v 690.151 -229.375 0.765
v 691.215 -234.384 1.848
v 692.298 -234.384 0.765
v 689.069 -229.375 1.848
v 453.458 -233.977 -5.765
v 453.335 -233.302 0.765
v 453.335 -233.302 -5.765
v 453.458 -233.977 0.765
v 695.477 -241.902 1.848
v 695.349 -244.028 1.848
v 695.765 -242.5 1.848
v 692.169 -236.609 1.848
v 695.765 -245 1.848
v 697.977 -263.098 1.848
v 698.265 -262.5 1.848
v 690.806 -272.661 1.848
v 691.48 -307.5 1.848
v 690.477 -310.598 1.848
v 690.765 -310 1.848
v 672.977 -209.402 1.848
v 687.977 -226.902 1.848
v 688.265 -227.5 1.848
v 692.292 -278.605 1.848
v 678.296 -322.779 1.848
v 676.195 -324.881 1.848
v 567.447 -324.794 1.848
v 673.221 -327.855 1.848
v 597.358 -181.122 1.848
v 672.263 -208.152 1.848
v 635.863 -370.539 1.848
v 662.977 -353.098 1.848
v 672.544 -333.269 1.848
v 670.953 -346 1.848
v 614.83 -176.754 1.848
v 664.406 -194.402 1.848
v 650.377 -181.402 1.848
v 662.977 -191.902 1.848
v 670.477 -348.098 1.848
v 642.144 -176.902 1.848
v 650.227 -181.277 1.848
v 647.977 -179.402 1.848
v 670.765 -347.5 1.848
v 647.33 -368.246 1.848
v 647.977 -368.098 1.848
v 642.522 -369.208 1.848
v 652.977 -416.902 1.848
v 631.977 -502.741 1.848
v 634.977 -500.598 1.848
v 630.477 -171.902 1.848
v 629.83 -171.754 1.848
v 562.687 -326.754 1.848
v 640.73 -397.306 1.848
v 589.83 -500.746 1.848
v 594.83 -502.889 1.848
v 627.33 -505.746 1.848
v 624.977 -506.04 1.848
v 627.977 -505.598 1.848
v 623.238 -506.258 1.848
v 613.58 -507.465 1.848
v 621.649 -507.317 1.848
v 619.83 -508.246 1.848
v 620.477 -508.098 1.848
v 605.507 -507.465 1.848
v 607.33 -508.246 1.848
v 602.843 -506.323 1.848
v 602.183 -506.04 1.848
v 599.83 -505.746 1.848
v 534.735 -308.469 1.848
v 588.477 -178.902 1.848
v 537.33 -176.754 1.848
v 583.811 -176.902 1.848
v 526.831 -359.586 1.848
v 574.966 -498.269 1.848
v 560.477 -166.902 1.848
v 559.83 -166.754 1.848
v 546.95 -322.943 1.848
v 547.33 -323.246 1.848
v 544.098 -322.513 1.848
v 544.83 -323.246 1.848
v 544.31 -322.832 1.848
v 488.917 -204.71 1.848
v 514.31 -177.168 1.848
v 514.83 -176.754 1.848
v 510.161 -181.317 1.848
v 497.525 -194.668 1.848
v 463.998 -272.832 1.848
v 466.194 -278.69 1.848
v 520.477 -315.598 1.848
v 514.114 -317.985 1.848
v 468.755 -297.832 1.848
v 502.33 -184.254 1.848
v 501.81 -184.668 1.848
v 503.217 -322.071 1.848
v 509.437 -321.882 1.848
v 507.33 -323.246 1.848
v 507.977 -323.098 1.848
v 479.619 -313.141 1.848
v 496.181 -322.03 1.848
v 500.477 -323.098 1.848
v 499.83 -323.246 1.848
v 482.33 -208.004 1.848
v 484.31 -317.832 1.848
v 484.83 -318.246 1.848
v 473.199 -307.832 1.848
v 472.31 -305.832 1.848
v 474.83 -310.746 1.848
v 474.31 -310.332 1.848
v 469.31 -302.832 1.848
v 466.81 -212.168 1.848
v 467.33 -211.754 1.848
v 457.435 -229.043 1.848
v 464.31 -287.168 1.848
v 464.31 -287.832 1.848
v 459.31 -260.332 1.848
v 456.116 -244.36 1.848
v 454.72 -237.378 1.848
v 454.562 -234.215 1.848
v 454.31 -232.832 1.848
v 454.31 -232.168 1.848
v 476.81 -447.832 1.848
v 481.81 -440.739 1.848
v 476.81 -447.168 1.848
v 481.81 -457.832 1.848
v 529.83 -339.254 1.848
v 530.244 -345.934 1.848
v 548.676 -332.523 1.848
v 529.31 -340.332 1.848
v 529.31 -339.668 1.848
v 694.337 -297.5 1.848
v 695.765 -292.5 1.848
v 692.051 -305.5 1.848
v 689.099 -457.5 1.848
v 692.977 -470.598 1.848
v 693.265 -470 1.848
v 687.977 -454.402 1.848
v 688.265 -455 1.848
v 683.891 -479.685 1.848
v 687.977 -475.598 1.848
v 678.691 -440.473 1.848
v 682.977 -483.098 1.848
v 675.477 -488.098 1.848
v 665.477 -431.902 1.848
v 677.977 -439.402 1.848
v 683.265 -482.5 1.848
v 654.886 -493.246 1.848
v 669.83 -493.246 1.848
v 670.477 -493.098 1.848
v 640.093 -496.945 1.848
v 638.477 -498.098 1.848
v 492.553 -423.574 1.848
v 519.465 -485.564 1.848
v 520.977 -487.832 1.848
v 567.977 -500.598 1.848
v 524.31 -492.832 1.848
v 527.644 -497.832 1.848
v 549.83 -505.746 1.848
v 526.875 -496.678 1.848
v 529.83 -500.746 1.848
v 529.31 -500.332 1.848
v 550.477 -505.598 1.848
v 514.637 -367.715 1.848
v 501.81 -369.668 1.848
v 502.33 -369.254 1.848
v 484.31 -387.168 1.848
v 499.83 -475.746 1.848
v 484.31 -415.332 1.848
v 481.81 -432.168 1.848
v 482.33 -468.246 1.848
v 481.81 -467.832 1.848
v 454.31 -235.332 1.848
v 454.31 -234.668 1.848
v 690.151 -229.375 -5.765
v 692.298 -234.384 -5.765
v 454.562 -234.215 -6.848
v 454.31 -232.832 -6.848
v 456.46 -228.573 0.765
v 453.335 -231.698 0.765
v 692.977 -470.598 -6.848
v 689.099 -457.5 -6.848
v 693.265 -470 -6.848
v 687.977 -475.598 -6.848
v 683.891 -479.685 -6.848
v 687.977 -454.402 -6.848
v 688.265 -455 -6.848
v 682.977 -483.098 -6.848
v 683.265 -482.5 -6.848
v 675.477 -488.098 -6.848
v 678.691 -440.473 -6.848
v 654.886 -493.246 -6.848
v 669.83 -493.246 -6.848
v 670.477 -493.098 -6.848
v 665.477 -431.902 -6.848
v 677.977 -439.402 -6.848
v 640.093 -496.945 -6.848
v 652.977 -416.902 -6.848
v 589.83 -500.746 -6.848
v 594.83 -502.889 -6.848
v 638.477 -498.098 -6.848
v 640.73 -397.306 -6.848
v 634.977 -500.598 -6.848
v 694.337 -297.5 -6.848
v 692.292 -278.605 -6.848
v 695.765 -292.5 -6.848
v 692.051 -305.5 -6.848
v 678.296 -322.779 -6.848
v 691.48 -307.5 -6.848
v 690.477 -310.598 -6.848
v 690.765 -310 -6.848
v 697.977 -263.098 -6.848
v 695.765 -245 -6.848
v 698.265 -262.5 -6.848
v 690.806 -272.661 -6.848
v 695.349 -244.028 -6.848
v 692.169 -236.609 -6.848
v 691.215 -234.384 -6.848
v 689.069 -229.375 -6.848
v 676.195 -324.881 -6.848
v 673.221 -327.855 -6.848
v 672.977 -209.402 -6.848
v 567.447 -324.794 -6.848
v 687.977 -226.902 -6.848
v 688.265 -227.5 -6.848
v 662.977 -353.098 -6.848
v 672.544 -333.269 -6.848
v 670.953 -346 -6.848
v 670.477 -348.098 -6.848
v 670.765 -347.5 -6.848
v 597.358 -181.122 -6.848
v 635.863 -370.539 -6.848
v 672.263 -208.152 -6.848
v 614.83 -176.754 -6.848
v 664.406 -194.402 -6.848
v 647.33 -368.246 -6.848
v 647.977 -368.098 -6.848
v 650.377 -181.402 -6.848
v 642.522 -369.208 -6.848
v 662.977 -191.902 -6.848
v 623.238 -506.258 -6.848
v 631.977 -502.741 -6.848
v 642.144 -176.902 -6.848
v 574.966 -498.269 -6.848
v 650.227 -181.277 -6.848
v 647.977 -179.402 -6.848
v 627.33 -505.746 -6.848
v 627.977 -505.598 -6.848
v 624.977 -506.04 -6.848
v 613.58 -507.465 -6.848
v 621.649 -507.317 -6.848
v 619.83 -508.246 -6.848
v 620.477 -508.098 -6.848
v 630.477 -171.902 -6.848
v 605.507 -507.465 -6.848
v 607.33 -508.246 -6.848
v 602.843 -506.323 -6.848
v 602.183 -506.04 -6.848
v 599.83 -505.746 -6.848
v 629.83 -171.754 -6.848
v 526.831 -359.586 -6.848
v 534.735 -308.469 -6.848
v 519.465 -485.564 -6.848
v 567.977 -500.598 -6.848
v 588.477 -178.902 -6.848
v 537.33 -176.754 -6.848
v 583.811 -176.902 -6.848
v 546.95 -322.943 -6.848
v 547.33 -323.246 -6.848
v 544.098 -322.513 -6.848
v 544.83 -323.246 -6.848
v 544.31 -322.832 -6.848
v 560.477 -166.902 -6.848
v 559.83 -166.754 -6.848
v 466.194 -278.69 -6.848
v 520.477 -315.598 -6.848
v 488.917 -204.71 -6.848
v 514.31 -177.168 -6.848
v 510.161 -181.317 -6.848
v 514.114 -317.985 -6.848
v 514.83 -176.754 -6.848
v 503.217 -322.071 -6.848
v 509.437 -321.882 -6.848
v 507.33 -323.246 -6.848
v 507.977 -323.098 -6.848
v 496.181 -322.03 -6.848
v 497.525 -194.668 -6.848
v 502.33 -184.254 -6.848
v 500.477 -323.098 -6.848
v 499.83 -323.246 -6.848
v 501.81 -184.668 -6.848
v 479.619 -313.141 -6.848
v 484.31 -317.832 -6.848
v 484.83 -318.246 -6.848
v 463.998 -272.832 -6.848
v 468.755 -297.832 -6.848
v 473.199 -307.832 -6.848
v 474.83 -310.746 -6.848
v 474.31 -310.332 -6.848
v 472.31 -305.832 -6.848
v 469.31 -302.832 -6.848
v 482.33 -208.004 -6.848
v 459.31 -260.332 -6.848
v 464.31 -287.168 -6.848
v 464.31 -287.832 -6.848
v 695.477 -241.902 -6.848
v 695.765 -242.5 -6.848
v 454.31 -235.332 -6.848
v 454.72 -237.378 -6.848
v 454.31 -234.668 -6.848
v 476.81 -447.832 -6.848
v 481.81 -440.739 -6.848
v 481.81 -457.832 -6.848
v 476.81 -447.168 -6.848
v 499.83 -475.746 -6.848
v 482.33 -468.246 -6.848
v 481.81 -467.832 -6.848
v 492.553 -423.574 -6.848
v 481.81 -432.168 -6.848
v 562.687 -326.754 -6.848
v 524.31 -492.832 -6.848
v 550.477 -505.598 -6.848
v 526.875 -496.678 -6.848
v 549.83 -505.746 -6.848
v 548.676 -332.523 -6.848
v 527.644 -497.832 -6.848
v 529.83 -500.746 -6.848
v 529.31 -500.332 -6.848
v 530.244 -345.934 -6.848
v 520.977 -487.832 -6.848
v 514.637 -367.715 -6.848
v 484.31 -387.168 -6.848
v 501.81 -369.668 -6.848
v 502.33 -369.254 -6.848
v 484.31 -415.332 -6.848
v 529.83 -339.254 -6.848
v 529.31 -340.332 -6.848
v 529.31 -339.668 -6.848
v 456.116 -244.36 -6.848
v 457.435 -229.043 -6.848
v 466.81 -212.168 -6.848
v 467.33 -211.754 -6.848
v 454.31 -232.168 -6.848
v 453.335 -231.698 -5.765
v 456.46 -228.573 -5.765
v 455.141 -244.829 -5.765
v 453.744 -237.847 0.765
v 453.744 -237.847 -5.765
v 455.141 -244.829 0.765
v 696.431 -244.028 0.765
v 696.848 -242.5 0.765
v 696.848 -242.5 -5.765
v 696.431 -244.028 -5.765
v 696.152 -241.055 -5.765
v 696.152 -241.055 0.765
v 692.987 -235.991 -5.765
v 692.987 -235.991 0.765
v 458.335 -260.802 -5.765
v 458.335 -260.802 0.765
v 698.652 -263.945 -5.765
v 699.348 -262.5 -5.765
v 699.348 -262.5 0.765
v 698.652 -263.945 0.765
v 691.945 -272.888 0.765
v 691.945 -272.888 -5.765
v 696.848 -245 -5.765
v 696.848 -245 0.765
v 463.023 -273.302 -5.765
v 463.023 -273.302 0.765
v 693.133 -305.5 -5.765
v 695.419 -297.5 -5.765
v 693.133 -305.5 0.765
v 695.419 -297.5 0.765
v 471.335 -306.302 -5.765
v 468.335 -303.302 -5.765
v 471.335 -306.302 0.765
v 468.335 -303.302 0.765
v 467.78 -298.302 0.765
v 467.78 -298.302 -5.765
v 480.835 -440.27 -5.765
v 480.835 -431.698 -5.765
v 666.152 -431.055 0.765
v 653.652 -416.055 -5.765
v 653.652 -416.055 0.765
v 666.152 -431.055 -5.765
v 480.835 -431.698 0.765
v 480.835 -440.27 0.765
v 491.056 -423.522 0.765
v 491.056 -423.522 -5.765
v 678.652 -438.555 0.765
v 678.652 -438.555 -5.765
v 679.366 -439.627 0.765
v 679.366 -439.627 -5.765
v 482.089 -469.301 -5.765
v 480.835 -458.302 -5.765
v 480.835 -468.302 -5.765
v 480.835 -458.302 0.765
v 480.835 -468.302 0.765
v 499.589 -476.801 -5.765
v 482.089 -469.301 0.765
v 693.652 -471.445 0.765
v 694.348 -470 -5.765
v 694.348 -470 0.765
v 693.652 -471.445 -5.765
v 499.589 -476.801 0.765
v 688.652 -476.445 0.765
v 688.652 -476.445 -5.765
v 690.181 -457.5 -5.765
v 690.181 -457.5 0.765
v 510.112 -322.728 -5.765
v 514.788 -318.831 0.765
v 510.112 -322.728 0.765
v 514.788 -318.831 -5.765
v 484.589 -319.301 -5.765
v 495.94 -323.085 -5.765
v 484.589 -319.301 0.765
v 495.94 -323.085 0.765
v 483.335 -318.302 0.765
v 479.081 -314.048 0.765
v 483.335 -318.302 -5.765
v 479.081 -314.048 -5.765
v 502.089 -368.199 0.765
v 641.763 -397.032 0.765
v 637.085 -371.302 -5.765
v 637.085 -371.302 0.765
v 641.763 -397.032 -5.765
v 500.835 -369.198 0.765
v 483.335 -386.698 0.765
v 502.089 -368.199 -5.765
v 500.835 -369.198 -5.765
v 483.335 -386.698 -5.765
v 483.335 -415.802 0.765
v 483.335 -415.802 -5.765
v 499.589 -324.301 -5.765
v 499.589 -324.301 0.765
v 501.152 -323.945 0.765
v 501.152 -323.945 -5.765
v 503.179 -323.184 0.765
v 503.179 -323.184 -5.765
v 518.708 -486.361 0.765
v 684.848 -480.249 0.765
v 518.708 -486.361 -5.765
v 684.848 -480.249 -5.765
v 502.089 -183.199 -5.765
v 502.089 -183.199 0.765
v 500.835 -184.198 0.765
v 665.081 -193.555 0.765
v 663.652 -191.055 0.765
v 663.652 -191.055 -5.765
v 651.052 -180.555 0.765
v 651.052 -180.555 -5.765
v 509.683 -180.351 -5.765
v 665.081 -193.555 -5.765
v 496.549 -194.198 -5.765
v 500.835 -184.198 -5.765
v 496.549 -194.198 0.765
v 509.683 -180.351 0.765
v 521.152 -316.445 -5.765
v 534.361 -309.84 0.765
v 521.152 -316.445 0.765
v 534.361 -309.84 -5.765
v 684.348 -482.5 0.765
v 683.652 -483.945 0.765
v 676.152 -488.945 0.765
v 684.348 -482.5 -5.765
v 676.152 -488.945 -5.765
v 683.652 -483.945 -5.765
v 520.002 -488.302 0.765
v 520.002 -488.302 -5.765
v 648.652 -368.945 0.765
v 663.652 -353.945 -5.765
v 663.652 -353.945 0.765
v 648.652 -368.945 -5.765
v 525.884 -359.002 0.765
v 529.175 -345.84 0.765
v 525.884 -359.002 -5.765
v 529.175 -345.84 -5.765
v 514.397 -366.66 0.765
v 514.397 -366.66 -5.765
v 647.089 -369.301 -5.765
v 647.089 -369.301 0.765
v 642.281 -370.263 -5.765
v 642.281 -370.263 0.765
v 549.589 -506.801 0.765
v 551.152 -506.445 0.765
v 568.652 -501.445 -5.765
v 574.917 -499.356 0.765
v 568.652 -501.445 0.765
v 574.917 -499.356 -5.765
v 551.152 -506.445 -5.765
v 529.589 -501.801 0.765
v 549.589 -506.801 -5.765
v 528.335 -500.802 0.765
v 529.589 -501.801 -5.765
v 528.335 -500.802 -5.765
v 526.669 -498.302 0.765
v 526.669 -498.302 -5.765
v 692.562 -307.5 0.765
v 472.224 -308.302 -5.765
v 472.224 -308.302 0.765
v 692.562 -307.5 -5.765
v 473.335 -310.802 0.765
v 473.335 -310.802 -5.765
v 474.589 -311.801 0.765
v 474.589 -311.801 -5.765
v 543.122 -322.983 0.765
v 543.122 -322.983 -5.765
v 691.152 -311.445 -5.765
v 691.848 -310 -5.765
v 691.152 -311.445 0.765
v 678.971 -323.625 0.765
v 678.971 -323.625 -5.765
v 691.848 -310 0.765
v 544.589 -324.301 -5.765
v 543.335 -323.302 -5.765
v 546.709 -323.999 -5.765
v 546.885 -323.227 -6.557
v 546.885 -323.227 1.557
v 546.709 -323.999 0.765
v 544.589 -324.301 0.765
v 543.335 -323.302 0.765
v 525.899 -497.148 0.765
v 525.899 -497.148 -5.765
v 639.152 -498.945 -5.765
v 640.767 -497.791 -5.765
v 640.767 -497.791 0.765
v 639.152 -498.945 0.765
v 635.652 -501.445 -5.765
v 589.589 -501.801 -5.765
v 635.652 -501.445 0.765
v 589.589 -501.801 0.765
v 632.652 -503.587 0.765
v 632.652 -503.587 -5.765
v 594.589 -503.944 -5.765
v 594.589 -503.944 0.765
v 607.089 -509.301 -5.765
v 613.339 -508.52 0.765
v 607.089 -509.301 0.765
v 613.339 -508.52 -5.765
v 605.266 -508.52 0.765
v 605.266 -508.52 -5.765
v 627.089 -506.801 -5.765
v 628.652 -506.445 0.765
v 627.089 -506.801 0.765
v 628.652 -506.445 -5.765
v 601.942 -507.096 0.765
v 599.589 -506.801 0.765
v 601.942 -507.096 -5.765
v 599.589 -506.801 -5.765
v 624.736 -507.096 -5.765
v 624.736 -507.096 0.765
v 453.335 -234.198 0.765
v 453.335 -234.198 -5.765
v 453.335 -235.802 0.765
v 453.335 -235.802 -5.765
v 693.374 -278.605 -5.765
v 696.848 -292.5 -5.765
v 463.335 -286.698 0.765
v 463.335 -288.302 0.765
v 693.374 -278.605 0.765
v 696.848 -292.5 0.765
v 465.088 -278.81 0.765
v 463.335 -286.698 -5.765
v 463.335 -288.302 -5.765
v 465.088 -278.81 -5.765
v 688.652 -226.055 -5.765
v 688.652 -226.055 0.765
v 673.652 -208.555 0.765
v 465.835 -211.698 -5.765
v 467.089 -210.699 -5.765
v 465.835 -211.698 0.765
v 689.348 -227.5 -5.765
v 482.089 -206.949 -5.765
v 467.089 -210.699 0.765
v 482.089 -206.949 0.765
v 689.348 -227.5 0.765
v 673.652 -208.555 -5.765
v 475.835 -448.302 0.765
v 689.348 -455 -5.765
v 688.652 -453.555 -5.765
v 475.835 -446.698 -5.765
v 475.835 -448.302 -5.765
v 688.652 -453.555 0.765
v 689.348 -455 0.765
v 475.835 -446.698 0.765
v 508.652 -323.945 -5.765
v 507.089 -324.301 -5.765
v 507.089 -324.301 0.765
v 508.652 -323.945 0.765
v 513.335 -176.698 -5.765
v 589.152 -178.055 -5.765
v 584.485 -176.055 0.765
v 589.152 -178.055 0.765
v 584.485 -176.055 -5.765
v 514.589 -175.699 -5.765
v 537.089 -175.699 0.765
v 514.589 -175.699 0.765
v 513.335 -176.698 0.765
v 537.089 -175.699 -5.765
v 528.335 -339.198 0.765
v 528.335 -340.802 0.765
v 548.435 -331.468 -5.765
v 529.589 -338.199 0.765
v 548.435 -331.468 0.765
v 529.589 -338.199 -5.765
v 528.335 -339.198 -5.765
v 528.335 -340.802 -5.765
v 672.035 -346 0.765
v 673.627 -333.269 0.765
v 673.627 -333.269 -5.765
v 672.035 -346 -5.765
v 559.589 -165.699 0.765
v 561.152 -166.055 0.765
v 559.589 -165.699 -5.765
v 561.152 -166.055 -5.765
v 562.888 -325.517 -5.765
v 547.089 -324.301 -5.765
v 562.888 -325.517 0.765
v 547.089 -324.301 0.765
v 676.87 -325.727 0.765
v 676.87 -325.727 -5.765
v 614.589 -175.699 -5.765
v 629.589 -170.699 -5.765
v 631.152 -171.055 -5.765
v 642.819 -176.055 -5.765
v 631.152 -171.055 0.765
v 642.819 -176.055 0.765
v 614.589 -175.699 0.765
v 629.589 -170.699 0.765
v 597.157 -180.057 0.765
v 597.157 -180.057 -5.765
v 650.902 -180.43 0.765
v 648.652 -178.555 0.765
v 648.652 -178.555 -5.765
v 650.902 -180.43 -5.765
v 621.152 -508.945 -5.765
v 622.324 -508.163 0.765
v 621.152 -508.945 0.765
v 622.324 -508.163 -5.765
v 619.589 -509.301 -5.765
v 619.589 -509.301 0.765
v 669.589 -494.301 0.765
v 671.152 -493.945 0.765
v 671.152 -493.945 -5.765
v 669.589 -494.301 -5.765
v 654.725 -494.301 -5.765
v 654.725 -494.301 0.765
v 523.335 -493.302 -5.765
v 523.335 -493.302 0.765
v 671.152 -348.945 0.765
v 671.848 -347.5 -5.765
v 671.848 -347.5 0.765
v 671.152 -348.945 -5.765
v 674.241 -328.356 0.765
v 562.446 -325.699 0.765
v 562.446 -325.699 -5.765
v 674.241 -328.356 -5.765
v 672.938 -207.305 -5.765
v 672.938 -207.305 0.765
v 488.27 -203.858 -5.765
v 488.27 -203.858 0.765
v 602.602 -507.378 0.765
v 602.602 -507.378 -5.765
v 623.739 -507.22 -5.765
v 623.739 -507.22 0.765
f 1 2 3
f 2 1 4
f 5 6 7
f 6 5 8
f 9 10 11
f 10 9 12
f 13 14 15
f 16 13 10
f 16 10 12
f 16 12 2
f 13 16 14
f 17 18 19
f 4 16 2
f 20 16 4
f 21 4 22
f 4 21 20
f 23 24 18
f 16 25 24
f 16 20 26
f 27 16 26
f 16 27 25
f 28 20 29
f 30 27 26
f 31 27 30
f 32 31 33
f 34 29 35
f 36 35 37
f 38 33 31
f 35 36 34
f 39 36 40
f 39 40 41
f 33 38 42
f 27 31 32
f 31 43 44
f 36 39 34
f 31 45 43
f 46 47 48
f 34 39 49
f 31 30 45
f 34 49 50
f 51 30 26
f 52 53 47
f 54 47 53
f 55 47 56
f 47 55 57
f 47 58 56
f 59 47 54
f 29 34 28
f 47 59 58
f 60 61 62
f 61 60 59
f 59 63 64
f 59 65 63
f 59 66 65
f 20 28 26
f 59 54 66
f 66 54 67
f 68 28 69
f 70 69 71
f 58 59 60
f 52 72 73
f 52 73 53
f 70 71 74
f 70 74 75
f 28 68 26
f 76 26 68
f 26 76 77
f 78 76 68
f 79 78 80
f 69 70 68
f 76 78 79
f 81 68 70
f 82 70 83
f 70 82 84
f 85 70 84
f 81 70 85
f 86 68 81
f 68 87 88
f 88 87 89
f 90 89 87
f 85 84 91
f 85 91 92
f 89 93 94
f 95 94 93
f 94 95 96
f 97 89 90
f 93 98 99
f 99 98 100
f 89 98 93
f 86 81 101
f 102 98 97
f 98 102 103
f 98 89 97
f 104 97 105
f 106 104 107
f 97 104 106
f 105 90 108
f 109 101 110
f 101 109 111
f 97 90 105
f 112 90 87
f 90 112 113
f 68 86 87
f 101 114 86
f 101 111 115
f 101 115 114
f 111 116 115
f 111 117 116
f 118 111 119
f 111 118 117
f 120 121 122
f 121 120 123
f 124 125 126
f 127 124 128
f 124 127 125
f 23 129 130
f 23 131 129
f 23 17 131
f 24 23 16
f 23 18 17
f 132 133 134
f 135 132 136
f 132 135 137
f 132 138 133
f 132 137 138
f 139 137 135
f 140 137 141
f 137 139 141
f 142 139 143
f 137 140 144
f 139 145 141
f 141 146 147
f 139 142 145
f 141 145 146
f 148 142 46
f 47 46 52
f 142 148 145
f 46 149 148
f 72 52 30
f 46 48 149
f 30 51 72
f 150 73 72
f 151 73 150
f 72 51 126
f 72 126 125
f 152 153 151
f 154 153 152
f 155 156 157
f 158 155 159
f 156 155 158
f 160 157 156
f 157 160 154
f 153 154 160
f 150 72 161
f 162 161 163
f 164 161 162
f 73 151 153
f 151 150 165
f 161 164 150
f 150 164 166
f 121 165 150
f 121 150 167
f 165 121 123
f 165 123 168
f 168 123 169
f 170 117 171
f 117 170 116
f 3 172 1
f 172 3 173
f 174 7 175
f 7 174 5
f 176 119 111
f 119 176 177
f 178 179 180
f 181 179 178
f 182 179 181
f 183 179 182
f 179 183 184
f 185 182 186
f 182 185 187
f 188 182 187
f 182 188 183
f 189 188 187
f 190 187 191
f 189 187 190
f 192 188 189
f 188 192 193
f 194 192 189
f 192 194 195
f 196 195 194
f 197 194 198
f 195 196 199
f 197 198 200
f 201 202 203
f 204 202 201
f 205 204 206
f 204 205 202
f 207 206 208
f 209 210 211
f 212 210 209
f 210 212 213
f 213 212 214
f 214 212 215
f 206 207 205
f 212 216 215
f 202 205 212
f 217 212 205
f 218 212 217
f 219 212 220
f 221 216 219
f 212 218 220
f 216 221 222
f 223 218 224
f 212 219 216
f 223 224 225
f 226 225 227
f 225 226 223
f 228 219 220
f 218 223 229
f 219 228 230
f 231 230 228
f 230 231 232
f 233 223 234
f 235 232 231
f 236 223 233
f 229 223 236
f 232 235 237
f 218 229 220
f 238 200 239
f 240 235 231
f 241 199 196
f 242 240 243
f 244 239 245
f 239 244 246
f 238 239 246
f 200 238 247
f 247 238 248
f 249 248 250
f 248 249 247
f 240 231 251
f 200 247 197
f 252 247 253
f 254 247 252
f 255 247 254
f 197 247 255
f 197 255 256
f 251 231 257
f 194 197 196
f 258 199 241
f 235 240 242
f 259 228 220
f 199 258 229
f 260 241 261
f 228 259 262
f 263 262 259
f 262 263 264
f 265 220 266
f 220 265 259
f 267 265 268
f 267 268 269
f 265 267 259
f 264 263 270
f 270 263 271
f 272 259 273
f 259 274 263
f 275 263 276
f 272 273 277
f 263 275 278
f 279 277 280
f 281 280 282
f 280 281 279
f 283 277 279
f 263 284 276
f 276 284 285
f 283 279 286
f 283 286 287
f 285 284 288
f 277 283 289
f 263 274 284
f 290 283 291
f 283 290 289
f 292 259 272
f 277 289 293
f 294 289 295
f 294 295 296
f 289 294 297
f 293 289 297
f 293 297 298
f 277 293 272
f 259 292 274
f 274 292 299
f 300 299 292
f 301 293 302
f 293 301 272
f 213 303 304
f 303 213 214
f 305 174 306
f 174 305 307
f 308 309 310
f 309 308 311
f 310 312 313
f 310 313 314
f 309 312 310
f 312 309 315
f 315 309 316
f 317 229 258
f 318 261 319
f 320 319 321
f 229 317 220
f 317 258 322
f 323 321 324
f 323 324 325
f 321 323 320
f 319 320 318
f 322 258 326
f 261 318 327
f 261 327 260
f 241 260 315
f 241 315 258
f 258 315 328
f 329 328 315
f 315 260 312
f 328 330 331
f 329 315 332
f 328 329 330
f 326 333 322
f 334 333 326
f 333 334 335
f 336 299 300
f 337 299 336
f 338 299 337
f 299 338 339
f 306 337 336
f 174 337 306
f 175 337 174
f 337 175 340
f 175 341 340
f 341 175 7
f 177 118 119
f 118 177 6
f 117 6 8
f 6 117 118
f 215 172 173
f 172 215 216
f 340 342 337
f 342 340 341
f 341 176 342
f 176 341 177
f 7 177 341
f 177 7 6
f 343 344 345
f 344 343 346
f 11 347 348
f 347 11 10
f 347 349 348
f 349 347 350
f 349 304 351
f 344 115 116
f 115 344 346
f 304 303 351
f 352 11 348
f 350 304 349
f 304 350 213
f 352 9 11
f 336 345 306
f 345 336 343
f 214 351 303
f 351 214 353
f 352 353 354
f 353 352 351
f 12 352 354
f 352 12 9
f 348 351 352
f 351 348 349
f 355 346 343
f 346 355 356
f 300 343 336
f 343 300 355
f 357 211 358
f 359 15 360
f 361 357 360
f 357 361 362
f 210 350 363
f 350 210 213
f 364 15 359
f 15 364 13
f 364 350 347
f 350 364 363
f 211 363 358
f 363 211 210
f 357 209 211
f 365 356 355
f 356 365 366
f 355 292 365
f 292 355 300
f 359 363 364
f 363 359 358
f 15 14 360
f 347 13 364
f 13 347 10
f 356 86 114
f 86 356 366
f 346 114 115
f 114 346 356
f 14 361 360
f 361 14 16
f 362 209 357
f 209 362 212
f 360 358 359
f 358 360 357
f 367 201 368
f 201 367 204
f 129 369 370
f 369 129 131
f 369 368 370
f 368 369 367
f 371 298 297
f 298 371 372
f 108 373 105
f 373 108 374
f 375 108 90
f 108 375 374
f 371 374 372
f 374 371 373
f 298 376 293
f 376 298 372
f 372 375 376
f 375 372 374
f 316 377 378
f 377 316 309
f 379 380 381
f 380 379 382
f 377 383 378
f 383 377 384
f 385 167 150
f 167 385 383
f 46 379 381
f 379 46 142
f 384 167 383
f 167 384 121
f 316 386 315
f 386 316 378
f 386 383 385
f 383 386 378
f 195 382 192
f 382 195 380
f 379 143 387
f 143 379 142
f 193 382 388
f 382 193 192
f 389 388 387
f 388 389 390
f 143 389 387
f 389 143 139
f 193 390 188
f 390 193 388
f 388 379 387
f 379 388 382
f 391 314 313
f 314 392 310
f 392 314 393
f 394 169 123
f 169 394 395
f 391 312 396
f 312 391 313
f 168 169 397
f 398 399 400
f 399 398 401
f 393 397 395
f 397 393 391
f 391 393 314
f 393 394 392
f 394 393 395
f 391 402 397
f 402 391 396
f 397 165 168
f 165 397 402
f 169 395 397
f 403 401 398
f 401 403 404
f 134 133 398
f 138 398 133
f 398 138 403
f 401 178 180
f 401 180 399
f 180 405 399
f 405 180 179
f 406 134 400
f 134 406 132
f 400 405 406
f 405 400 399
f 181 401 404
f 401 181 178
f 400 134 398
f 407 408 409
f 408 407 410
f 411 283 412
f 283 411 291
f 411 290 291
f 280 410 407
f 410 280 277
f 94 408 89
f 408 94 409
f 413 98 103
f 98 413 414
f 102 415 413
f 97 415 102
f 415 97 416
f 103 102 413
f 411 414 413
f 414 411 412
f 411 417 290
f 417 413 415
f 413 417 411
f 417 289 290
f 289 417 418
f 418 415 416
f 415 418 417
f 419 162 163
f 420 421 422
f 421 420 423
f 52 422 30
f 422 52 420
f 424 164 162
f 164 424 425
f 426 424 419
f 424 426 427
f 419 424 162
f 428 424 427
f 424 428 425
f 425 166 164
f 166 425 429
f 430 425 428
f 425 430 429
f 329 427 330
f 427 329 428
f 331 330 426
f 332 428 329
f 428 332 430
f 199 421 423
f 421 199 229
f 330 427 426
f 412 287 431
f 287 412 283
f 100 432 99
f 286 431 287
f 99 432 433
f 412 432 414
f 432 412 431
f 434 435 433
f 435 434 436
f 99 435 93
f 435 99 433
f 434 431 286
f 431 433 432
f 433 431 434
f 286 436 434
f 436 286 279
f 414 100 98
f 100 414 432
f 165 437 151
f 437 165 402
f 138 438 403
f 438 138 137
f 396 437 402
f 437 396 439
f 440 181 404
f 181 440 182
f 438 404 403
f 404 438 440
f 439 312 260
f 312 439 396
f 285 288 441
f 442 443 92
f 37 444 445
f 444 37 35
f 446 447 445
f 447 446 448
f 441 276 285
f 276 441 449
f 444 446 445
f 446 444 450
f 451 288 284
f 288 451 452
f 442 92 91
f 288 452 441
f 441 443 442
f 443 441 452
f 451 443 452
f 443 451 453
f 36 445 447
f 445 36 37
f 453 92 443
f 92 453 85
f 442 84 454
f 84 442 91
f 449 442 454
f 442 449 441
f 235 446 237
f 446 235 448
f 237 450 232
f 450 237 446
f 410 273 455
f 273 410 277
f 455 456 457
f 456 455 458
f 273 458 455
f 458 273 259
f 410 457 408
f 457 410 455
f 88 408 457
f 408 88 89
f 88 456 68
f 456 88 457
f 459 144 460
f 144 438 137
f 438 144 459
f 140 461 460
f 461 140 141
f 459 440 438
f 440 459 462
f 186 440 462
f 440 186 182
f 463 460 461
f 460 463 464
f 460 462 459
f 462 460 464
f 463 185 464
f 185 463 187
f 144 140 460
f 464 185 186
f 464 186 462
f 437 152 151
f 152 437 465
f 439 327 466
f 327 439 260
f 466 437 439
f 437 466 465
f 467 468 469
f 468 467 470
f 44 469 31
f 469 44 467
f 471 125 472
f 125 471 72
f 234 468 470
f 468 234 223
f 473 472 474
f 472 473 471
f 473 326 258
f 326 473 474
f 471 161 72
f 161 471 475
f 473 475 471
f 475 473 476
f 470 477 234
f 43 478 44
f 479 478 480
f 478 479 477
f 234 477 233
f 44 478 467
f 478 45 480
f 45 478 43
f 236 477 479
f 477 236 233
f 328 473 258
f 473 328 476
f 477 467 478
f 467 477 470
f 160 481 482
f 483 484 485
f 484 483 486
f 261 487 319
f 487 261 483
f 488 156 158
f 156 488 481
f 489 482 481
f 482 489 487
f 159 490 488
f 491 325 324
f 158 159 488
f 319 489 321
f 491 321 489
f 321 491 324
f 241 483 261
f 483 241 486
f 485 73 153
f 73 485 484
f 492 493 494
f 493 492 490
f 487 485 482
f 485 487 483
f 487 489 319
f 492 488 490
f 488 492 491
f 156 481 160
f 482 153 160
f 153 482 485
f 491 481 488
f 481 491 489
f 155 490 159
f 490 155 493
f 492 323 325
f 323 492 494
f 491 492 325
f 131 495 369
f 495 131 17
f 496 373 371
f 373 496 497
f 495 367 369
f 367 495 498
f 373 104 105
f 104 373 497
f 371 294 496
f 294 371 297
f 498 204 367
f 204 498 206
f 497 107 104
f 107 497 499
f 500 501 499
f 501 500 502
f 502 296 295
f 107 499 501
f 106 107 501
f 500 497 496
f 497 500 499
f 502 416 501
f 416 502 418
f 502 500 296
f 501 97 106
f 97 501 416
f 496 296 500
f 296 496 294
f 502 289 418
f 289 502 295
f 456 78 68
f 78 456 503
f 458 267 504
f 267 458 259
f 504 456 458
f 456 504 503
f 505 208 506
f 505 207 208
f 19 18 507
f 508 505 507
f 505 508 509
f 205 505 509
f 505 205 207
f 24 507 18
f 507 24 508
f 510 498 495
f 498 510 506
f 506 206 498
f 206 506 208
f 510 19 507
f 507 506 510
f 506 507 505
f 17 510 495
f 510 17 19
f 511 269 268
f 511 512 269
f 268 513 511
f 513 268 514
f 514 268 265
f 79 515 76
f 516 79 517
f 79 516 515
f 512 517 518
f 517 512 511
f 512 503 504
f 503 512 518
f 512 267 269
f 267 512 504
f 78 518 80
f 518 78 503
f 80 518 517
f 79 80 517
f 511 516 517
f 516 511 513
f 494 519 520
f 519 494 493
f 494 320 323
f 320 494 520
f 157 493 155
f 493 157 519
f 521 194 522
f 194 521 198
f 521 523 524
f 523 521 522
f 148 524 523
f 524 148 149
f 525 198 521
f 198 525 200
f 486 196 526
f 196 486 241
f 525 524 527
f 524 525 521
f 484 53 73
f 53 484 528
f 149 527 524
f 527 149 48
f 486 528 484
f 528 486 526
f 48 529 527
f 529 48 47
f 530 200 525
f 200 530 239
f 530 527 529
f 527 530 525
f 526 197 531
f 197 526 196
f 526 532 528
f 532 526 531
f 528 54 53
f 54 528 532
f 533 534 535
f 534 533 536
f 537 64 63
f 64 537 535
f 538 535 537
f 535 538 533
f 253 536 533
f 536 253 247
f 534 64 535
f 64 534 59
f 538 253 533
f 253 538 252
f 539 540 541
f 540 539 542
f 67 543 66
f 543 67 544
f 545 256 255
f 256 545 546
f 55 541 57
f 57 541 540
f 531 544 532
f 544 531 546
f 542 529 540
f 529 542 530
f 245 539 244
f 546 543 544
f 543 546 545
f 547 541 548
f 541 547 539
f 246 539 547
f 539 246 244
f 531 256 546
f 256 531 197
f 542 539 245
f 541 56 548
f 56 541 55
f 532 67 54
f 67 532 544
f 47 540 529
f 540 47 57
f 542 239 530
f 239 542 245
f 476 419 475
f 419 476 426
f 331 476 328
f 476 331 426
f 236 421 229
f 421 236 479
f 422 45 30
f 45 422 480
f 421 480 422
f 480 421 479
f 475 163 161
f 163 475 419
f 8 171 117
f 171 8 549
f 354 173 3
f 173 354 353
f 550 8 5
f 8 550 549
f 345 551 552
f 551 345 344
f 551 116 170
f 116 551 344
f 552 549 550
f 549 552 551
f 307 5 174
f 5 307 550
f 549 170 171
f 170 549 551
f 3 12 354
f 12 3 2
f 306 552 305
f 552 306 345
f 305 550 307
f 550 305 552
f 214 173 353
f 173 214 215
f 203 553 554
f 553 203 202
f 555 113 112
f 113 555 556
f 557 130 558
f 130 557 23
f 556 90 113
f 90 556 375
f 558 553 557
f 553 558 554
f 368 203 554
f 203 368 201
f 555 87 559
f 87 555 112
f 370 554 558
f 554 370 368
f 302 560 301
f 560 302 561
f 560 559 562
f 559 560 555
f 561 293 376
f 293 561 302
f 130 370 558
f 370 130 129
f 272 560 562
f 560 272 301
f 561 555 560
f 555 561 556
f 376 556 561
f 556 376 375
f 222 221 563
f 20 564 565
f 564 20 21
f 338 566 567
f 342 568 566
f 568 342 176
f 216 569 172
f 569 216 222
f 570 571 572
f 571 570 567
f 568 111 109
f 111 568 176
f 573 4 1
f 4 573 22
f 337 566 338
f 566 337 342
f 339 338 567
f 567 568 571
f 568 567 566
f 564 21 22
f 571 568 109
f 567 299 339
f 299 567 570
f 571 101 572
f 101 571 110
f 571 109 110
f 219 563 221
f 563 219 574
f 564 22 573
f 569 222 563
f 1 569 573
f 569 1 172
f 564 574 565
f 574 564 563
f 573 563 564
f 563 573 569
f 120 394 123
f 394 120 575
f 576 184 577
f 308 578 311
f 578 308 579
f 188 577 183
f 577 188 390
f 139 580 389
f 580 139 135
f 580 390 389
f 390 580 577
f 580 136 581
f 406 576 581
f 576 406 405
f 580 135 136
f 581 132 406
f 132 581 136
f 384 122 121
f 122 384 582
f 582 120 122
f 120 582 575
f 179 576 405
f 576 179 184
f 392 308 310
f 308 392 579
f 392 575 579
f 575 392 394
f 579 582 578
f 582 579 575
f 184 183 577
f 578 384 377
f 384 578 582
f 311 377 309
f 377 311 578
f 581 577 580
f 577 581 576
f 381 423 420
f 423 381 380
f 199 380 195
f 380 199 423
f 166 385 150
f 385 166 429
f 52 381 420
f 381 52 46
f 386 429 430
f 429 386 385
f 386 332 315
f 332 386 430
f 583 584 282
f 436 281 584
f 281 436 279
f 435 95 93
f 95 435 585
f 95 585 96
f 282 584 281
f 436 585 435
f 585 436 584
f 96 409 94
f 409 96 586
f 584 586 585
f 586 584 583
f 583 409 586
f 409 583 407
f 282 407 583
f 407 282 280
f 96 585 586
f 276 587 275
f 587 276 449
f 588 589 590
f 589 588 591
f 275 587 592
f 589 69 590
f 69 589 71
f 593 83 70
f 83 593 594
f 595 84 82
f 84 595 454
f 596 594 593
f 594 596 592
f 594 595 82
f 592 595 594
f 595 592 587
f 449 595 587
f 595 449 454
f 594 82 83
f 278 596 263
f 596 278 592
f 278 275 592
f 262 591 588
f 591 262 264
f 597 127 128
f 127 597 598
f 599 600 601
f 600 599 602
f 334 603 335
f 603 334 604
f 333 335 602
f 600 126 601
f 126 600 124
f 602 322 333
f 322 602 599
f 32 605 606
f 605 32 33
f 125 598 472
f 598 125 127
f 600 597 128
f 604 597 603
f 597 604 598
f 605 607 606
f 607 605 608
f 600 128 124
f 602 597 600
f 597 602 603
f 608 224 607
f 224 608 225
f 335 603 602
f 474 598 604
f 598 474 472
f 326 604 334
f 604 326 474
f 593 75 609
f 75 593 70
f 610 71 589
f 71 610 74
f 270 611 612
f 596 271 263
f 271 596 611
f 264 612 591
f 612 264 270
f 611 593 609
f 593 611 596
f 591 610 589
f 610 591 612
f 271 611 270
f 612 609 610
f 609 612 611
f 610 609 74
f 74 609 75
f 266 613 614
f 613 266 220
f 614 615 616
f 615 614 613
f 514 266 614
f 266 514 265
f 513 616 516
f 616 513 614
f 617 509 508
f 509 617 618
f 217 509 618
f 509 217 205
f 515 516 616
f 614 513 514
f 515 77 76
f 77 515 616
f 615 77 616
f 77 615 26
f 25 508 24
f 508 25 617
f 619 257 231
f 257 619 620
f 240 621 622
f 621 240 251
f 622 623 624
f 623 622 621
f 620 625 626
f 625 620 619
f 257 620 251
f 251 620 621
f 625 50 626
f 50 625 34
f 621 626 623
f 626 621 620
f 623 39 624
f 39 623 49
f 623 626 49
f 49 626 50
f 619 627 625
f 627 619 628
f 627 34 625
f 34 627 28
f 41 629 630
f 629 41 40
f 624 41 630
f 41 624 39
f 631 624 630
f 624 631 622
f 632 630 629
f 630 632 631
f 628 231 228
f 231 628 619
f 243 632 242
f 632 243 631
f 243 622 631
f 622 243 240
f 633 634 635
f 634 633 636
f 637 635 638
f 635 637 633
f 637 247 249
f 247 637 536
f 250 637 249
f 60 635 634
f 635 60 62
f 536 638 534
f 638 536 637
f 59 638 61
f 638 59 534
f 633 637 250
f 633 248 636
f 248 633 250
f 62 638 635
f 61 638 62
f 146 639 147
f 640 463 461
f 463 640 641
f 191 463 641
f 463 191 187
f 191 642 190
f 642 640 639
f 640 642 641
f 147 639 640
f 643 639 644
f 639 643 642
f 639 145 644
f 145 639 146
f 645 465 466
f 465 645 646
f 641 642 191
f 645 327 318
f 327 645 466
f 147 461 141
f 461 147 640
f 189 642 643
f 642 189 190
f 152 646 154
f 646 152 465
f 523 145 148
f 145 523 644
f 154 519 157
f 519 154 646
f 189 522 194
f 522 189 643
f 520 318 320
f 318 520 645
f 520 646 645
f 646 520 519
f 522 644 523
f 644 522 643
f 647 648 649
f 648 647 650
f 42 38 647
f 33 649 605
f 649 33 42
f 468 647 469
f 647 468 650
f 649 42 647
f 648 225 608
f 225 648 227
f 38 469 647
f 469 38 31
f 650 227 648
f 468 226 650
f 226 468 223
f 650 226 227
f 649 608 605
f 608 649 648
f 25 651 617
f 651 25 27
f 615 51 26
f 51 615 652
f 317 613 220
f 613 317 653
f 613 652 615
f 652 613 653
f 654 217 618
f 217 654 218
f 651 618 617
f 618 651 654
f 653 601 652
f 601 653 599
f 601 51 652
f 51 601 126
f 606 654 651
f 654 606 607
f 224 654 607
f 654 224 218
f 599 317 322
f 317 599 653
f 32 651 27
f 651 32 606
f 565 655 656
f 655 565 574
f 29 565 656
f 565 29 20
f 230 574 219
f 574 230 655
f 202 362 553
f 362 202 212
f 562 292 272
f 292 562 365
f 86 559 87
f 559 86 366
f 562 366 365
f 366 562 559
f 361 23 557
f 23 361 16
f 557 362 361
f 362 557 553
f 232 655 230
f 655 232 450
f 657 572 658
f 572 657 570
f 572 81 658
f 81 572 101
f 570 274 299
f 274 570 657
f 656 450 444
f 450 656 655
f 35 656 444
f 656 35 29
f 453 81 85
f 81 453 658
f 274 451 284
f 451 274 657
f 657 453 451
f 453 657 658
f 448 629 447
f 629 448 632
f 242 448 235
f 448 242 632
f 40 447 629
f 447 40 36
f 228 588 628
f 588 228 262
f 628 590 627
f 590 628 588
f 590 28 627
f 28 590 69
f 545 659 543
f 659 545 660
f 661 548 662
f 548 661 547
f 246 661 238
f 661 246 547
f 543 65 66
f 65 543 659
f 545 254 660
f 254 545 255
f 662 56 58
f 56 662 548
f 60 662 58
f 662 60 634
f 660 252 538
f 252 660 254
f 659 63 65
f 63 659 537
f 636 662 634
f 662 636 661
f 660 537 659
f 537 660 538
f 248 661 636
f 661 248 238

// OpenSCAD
minkowski(){
union(){
translate([0,-10,0])intersection(){linear_extrude(height=1000, slices=1, twist=0, center=true){polygon([[455.0,-225.0],[460.0,-250.0],[470.0,-255.0],[465.0,-277.5],[475.0,-300.0],[490.0,-307.5],[507.5,-312.5],[522.5,-300.0],[535.0,-297.5],[547.5,-312.5],[580.0,-315.0],[565.0,-317.5],[530.0,-330.0],[535.0,-360.0],[522.5,-357.5],[502.5,-360.0],[485.0,-377.5],[485.0,-405.0],[495.0,-415.0],[477.5,-437.5],[487.5,-457.5],[505.0,-465.0],[522.5,-470.0],[532.5,-490.0],[550.0,-495.0],[567.5,-490.0],[582.5,-485.0],[600.0,-495.0],[620.0,-497.5],[635.0,-487.5],[655.0,-482.5],[670.0,-482.5],[685.0,-467.5],[692.5,-460.0],[687.5,-445.0],[677.5,-430.0],[665.0,-422.5],[652.5,-407.5],[640.0,-387.5],[635.0,-360.0],[647.5,-357.5],[662.5,-342.5],[670.0,-337.5],[672.5,-317.5],[690.0,-300.0],[695.0,-282.5],[690.0,-262.5],[697.5,-252.5],[695.0,-235.0],[687.5,-217.5],[672.5,-200.0],[662.5,-182.5],[647.5,-170.0],[630.0,-162.5],[615.0,-167.5],[595.0,-172.5],[577.5,-165.0],[560.0,-157.5],[537.5,-167.5],[515.0,-167.5],[502.5,-180.0],[487.5,-197.5],[467.5,-202.5],[455.0,-225.0]]);}rotate([90,0,0])linear_extrude(height=1000, slices=1, twist=0, center=true){polygon([[697.5,-0.0],[697.5,-5.0],[455.0,-5.0],[455.0,-0.0]]);}}
translate([0,-10,0])intersection(){linear_extrude(height=1000, slices=1, twist=0, center=true){polygon([[455.0,-222.5],[460.0,-250.0],[467.5,-270.0],[470.0,-292.5],[485.0,-307.5],[500.0,-312.5],[520.0,-305.0],[535.0,-297.5],[545.0,-312.5],[562.5,-310.0],[575.0,-312.5],[532.5,-330.0],[527.5,-350.0],[512.5,-360.0],[485.0,-377.5],[487.5,-405.0],[495.0,-412.5],[482.5,-422.5],[482.5,-457.5],[500.0,-465.0],[520.0,-475.0],[530.0,-490.0],[550.0,-495.0],[575.0,-487.5],[590.0,-490.0],[607.5,-497.5],[627.5,-495.0],[645.0,-482.5],[667.5,-482.5],[682.5,-472.5],[687.5,-450.0],[677.5,-432.5],[662.5,-422.5],[652.5,-412.5],[640.0,-390.0],[635.0,-360.0],[655.0,-350.0],[667.5,-327.5],[675.0,-312.5],[690.0,-297.5],[692.5,-282.5],[687.5,-260.0],[695.0,-232.5],[682.5,-212.5],[670.0,-202.5],[660.0,-182.5],[637.5,-167.5],[617.5,-167.5],[600.0,-172.5],[580.0,-167.5],[560.0,-160.0],[542.5,-167.5],[522.5,-167.5],[502.5,-175.0],[495.0,-192.5],[475.0,-202.5],[455.0,-222.5]]);}rotate([90,0,0])linear_extrude(height=1000, slices=1, twist=0, center=true){polygon([[695.0,-0.0],[695.0,-5.0],[455.0,-5.0],[455.0,-0.0]]);}}
}
sphere(r=2);}
